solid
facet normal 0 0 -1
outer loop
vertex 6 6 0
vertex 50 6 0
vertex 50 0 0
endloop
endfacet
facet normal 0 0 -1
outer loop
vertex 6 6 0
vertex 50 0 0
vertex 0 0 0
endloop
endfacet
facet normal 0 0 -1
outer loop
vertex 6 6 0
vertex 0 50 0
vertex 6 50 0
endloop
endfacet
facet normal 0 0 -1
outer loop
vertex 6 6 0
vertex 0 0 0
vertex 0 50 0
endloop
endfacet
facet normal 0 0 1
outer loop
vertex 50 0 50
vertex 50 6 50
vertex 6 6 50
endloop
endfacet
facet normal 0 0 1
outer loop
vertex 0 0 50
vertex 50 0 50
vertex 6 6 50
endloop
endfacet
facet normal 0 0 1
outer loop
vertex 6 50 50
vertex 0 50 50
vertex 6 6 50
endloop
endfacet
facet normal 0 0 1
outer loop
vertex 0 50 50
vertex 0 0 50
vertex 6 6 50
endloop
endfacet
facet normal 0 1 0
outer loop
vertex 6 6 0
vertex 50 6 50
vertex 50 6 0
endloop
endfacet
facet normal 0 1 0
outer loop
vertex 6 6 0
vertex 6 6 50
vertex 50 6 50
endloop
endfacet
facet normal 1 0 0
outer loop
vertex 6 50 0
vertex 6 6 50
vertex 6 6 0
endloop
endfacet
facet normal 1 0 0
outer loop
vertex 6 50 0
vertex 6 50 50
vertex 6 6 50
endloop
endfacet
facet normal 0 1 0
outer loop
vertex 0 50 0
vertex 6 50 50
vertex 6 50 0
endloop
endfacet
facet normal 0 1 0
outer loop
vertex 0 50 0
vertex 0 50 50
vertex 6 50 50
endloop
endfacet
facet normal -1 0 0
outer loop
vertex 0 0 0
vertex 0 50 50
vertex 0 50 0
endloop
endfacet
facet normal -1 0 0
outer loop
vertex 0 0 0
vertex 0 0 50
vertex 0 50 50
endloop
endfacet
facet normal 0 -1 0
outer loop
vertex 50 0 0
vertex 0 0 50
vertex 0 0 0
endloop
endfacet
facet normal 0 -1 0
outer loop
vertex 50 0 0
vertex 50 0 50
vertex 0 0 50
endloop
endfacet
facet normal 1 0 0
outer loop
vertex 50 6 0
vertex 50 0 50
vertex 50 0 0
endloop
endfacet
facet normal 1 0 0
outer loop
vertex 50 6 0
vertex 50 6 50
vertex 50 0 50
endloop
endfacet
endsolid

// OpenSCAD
$fn = 32;

// ----------------------------------------------------------------------
// Structural section: angle 50 x 50 mm
// ----------------------------------------------------------------------

// --- parameters (mm) ---
sec_w = 50;               // leg width, X
sec_h = 50;               // leg height, Y
flange_t = 6;             // leg thickness
plate_t = 50;             // cut length, Z (extrusion height)

profile = [[0, 0], [50, 0], [50, 6], [6, 6], [6, 50], [0, 50]];  // primary outline, 6 points, counter clockwise

// --- the one profile operation ---
linear_extrude(height = plate_t) polygon(points = profile);
